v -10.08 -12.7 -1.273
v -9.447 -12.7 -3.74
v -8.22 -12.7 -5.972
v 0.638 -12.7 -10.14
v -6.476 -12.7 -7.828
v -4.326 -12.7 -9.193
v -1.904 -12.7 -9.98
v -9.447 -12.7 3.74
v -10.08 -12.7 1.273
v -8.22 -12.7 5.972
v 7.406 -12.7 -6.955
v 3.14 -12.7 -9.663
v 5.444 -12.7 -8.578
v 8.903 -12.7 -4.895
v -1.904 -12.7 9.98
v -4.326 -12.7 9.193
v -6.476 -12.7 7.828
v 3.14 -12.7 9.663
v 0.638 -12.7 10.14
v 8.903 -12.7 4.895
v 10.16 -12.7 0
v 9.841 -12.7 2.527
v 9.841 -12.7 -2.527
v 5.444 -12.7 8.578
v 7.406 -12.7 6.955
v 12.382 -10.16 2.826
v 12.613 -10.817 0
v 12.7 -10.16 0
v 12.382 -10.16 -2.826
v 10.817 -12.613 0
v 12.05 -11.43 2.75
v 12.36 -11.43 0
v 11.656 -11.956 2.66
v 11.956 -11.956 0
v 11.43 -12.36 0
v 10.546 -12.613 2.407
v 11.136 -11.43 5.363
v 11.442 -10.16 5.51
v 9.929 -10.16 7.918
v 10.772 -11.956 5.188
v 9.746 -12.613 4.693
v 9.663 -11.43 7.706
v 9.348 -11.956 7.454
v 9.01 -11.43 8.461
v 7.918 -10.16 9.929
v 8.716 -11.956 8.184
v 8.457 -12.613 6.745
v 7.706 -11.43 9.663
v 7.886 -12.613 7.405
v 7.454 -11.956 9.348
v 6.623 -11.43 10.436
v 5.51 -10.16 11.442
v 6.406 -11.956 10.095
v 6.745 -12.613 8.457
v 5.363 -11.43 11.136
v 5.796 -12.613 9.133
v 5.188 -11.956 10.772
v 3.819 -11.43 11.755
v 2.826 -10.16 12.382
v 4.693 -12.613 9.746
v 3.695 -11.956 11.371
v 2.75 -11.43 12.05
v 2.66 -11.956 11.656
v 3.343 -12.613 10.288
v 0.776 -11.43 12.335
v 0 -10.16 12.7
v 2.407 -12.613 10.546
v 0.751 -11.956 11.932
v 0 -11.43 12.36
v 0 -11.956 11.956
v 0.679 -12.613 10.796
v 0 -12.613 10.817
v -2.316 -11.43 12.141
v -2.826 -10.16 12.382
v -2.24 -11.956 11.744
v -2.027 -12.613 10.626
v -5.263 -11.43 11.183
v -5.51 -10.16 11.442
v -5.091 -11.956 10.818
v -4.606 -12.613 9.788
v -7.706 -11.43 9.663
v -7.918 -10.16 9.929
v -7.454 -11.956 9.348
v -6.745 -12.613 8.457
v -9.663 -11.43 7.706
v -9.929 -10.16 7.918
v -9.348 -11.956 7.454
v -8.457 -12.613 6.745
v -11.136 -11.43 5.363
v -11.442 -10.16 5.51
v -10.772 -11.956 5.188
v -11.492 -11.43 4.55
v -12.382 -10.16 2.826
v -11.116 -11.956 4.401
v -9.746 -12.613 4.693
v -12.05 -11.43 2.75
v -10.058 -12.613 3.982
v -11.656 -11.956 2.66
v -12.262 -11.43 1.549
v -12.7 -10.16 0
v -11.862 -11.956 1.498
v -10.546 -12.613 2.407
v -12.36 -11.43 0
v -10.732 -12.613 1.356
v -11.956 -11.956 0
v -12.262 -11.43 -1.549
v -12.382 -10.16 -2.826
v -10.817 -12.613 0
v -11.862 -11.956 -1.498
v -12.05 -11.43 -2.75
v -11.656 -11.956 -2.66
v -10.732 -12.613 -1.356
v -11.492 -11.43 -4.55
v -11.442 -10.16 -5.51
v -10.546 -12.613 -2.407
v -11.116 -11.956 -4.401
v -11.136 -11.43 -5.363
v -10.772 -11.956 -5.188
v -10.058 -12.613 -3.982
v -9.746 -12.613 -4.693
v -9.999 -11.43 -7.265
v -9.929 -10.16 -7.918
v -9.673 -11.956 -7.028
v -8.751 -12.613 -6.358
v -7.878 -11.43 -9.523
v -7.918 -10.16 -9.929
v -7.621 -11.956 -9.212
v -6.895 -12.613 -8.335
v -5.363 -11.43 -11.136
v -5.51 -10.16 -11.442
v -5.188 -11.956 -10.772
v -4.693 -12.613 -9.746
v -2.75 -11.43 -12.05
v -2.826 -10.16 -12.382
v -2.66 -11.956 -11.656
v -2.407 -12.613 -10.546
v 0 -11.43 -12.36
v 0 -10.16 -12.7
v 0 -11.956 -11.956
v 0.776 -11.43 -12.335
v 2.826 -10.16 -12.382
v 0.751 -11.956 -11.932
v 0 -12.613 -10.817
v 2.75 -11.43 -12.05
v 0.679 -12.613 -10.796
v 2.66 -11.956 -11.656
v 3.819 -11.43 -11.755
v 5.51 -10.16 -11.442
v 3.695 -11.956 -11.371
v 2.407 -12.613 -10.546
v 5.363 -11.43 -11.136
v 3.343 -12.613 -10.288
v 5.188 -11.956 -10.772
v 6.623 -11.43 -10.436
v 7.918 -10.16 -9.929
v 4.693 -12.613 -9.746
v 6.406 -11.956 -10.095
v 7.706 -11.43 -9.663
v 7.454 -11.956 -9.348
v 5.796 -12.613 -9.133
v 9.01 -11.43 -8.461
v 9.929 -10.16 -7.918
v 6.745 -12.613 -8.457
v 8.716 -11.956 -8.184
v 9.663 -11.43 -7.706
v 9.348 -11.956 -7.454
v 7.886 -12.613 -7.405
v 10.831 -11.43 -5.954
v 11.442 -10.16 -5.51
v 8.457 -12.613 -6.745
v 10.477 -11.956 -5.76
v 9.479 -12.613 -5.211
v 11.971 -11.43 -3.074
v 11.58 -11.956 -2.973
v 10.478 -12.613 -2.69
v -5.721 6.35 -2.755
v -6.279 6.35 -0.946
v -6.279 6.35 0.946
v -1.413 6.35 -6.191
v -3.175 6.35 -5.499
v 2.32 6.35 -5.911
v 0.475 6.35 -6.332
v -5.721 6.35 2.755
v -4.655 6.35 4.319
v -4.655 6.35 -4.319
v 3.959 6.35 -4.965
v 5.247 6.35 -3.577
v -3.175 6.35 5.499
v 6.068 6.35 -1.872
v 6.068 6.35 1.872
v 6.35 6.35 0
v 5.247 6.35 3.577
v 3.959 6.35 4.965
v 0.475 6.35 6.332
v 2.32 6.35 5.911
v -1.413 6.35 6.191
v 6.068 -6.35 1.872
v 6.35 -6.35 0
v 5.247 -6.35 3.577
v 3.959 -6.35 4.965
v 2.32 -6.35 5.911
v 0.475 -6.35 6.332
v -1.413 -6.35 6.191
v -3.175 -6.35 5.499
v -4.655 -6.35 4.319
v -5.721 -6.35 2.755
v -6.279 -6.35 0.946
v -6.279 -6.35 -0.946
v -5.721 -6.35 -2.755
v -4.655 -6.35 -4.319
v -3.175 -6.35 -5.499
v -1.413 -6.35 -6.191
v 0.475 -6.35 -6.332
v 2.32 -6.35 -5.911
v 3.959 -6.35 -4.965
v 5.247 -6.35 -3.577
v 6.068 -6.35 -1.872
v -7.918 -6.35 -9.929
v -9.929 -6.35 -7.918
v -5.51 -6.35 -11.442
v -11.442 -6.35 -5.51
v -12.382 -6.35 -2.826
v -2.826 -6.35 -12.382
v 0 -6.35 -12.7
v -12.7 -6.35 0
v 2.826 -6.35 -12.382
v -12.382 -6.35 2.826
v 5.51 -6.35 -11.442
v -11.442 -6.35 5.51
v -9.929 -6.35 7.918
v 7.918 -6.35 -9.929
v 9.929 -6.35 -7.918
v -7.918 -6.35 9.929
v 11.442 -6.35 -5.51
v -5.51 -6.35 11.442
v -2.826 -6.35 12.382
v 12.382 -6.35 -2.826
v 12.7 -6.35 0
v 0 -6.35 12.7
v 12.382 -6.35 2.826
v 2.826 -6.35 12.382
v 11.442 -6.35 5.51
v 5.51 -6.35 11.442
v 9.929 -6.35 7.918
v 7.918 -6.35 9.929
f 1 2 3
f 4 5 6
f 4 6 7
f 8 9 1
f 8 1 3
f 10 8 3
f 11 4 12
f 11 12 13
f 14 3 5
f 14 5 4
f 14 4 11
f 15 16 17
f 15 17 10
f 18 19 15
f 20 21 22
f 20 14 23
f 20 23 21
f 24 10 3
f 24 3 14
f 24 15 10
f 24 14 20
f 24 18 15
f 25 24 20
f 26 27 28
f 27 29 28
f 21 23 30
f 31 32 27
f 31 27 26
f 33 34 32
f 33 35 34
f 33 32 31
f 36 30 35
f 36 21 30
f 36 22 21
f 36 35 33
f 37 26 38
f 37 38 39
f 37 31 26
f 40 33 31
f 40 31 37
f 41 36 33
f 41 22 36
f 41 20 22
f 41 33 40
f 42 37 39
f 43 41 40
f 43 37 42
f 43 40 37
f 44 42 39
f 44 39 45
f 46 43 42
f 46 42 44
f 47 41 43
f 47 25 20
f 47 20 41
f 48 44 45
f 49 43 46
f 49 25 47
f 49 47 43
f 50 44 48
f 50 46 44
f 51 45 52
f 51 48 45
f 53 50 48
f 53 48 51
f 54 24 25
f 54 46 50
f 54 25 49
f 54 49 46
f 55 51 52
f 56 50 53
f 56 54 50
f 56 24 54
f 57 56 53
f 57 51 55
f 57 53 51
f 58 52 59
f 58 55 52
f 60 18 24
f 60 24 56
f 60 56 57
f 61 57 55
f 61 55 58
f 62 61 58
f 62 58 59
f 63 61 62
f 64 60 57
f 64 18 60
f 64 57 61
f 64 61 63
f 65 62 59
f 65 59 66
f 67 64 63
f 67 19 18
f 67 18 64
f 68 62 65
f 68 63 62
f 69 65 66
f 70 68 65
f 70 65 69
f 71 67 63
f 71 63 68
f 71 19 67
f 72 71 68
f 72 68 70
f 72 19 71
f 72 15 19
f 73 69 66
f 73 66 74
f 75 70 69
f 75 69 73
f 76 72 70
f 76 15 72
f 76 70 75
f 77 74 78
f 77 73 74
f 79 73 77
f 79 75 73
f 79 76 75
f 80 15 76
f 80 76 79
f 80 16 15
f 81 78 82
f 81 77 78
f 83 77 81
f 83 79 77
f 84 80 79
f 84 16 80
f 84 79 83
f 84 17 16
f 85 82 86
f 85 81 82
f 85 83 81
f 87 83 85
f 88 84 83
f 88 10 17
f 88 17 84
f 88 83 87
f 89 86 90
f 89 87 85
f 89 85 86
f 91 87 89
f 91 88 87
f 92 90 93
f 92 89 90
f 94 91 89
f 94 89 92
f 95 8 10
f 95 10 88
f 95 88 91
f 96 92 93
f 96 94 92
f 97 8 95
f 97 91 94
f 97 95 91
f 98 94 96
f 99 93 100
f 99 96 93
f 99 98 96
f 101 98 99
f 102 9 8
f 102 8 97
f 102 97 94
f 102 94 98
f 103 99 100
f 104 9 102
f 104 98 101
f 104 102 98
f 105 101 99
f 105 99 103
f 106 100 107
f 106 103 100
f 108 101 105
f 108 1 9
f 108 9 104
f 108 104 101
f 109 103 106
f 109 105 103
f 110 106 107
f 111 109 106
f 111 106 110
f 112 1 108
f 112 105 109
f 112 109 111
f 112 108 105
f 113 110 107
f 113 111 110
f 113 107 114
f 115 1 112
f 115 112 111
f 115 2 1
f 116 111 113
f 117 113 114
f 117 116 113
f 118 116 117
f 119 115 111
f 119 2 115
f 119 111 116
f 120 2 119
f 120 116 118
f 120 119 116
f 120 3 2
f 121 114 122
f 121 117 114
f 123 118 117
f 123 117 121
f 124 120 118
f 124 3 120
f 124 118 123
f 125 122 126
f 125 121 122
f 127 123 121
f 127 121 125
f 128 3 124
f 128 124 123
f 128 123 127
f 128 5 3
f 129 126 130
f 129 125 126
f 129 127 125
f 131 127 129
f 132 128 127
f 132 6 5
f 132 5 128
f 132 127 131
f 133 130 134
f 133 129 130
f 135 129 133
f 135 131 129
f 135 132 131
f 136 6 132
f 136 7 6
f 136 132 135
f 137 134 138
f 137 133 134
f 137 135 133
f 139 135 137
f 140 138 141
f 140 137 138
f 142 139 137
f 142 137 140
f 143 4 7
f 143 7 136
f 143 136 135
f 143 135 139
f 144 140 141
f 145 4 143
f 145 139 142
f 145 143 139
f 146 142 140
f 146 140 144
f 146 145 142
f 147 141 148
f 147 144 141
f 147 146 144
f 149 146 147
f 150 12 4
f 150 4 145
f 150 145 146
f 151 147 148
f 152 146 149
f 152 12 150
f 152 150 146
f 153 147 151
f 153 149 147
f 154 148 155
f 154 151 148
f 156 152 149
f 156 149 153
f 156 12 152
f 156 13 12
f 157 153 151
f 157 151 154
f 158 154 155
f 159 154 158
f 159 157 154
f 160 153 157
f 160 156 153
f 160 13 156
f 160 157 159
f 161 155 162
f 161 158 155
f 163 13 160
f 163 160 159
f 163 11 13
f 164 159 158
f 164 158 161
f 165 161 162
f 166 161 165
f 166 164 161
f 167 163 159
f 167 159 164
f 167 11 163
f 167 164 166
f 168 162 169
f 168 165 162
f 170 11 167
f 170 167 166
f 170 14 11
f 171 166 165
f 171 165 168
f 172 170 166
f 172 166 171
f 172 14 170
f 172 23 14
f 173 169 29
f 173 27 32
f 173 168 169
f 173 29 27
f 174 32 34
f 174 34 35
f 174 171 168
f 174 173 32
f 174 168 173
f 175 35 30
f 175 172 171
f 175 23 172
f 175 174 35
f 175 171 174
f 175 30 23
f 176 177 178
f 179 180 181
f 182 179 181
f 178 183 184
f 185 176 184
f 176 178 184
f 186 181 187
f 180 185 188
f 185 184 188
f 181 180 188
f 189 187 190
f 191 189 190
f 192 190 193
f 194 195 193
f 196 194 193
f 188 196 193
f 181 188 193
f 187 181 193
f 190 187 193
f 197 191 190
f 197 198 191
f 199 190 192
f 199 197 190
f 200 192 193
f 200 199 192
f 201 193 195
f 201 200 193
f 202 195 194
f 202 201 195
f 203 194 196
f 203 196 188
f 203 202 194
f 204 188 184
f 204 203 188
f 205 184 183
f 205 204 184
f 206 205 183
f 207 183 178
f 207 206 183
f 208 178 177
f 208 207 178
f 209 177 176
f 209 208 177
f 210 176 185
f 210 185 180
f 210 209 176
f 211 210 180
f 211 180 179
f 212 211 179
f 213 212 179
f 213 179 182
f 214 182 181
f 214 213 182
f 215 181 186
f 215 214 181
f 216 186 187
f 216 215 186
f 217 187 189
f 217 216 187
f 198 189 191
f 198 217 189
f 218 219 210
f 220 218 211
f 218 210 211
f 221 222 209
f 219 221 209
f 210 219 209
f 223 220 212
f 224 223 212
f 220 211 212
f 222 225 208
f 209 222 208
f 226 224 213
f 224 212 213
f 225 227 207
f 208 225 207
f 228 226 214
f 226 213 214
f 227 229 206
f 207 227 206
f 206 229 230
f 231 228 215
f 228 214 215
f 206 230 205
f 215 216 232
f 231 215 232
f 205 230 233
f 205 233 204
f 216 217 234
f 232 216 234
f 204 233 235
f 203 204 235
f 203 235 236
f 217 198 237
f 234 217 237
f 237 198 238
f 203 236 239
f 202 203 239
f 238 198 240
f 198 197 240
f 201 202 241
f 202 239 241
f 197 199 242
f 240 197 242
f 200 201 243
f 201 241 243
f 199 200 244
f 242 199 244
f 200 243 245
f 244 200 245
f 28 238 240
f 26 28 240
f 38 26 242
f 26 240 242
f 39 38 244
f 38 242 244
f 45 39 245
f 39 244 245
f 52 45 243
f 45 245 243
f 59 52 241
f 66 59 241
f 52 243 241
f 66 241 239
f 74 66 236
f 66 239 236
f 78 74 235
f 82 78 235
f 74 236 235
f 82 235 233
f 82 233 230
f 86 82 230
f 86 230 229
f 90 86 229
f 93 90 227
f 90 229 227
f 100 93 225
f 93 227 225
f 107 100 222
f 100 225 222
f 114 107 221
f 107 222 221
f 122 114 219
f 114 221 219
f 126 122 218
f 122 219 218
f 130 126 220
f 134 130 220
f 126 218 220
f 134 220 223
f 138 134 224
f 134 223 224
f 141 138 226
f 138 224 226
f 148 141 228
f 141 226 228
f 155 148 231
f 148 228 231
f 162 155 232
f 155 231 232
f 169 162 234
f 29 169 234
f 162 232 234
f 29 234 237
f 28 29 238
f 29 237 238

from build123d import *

# Parameters (mm, degrees)
F0_R     = 6.35
F1_DEPTH = 6.35
F2_R     = 12.7
F3_DEPTH = 6.35
F4_R     = 2.54


with BuildPart() as f1:
    # F0 (on Front) → F1 (new body, symmetric)
    with BuildSketch(Plane.XZ):
        Circle(F0_R)
    extrude(amount=F1_DEPTH, both=True)

    # F2 (on face) → F3 (join)
    with BuildSketch(Plane.XZ.offset(6.35)):
        Circle(F2_R)
    extrude(amount=F3_DEPTH)

    # F4
    f4_edges = [f1.edges().sort_by_distance(p)[0] for p in [
        (-12.7, -12.7, 0),
    ]]
    fillet(f4_edges, radius=F4_R)


solid = f1.part
